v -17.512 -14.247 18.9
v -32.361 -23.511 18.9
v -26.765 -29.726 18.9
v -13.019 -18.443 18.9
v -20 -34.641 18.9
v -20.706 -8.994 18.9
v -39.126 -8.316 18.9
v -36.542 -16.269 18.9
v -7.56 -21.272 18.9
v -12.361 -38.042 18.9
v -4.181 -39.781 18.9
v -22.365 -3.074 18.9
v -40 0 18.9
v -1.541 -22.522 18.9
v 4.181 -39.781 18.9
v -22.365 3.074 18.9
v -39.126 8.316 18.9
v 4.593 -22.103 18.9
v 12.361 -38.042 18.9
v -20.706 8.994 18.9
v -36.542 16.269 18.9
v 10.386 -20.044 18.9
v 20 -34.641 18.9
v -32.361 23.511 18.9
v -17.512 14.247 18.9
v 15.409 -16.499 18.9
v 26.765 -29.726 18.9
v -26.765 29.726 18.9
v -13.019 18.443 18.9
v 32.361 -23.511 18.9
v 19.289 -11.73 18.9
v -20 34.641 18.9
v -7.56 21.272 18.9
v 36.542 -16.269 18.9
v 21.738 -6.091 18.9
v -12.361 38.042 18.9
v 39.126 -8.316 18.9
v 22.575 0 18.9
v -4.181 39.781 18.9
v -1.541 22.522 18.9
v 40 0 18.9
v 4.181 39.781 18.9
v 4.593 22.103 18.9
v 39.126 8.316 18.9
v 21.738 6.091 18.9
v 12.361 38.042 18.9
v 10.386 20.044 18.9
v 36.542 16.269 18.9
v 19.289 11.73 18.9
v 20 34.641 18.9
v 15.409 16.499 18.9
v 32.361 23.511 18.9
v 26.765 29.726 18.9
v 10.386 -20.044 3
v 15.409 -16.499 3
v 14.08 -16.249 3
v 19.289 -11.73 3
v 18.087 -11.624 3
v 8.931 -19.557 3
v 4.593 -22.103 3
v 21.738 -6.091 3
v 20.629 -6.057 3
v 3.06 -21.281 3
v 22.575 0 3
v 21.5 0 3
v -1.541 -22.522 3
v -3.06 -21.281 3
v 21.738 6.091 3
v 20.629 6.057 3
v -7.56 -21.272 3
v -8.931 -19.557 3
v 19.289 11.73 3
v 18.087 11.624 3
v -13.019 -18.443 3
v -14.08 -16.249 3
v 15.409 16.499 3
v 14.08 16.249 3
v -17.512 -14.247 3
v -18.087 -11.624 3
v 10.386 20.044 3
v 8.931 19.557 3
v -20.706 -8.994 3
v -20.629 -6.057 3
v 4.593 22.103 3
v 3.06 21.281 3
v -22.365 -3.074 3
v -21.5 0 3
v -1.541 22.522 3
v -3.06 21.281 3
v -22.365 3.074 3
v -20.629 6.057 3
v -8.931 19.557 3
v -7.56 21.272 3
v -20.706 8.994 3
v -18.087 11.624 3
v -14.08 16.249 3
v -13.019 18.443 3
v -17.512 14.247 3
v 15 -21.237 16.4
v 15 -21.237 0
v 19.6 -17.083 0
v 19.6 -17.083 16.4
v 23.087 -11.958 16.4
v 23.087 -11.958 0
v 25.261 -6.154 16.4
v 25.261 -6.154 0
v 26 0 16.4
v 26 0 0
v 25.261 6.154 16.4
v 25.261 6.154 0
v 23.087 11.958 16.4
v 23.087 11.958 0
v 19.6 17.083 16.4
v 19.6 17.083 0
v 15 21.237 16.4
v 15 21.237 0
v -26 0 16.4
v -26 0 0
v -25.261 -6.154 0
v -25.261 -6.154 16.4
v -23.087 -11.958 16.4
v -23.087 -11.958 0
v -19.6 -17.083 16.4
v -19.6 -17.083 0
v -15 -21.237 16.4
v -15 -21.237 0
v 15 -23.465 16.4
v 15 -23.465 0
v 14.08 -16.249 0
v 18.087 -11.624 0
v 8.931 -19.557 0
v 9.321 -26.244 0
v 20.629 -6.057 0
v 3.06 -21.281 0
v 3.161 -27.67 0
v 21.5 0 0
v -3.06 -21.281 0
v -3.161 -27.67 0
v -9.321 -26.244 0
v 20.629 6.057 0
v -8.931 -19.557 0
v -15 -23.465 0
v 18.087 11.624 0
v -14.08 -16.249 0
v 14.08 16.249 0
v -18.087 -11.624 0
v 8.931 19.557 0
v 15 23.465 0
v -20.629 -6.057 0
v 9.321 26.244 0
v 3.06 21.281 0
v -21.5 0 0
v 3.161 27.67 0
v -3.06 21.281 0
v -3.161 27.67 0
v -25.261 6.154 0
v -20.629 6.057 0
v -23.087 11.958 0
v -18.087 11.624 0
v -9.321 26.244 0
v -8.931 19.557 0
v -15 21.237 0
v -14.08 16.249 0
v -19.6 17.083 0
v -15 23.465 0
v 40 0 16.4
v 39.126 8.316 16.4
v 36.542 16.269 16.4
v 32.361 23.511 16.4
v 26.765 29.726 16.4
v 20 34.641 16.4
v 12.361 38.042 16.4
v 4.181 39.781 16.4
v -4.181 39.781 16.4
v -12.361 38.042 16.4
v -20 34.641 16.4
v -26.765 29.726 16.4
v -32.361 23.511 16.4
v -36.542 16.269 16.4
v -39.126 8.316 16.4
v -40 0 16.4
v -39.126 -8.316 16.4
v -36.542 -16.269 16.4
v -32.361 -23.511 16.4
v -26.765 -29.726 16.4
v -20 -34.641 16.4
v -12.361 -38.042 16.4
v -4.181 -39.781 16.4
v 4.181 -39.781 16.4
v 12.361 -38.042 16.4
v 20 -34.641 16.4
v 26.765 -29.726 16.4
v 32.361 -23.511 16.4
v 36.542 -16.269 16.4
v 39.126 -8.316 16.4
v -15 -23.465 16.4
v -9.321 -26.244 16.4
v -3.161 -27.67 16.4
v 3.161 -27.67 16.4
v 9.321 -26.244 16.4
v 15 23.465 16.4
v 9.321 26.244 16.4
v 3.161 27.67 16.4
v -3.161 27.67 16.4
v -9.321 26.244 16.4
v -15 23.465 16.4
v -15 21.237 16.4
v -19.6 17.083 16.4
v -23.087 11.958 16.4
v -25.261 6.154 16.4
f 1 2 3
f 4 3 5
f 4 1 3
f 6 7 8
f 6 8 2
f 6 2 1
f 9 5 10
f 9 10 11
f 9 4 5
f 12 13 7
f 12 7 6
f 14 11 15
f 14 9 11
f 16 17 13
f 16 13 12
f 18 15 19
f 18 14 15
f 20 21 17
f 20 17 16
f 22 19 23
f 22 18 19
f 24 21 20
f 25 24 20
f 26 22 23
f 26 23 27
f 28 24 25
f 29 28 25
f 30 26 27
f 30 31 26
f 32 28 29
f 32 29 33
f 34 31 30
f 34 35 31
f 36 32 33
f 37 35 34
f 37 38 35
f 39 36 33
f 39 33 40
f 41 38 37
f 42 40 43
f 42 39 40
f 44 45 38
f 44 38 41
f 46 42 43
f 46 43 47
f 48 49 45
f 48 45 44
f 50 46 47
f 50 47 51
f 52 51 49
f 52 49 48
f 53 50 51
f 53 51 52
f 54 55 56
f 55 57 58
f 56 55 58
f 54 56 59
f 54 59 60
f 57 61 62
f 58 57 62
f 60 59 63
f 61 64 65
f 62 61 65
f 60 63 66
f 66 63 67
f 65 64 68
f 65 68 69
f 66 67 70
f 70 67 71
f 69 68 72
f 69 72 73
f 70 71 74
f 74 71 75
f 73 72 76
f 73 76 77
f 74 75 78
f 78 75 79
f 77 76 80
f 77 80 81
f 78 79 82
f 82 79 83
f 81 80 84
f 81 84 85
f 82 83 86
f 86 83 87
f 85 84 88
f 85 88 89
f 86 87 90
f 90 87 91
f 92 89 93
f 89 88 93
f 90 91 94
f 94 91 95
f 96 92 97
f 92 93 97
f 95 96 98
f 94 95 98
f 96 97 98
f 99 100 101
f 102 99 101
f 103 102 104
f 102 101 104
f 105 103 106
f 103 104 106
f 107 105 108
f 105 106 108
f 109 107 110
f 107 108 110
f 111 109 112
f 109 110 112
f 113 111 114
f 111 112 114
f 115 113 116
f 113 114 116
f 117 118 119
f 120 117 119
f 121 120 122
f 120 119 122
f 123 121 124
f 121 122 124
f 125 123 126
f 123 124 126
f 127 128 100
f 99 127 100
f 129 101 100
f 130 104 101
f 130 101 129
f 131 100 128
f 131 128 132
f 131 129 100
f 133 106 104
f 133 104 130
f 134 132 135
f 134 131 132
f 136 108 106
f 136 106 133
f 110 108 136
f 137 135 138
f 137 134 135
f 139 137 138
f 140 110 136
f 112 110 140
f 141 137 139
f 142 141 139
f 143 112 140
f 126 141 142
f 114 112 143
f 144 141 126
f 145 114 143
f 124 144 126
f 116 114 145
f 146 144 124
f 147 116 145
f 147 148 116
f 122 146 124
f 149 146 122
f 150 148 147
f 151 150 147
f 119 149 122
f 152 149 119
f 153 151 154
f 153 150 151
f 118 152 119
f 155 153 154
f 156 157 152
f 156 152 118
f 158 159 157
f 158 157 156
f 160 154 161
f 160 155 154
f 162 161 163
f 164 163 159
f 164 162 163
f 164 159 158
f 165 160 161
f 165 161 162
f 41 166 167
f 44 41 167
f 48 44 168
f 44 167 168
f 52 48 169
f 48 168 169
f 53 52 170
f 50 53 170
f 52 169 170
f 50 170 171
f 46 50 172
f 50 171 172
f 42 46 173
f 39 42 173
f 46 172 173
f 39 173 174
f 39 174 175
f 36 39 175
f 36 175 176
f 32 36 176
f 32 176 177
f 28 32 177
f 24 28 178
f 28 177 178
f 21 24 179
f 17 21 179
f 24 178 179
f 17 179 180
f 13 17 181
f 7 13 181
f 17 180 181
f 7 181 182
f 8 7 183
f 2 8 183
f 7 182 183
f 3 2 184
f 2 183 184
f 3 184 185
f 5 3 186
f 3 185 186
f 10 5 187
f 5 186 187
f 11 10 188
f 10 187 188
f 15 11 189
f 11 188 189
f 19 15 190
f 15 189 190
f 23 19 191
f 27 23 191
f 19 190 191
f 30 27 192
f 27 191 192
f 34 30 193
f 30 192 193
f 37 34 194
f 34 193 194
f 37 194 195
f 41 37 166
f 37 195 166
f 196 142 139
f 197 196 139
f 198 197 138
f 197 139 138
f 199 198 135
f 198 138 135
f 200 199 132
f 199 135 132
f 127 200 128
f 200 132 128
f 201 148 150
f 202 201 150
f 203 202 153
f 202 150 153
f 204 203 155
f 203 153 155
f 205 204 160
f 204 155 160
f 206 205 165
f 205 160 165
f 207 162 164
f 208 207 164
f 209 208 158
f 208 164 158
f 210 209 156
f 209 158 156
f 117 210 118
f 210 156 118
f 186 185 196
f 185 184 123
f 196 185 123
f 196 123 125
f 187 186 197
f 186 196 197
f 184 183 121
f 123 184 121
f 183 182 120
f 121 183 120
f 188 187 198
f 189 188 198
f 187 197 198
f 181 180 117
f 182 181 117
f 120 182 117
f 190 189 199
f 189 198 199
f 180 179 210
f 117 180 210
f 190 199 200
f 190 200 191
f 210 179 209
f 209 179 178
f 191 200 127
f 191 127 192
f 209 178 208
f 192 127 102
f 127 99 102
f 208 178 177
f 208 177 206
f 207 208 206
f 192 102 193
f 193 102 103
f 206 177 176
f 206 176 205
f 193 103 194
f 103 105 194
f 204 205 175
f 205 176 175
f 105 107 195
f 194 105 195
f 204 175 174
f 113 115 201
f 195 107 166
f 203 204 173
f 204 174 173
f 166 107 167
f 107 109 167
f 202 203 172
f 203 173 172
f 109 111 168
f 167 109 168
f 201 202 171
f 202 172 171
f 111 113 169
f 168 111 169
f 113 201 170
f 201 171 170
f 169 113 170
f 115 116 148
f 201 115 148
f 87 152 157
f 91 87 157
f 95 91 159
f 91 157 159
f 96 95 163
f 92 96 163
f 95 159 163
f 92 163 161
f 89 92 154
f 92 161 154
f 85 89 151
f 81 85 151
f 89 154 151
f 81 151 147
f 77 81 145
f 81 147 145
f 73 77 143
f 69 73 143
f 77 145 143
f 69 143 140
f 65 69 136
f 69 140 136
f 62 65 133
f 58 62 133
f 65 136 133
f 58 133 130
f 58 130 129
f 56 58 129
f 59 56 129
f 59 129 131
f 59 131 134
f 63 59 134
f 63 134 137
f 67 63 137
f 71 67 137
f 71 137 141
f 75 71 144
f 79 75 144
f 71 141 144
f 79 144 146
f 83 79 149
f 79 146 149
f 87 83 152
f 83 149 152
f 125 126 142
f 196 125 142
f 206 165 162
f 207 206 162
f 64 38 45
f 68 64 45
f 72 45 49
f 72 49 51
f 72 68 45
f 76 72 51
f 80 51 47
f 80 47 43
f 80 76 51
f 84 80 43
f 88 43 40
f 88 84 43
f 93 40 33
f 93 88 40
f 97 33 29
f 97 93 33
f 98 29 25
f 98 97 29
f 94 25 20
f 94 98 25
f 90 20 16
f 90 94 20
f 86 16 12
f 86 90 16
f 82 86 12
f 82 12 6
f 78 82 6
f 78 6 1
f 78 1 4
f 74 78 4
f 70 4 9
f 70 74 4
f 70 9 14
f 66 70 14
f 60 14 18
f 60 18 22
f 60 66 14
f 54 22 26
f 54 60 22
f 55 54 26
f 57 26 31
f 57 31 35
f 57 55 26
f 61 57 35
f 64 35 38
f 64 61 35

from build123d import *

# Parameters (mm, degrees)
SKETCH1_R           = 27.85
SKETCH1_R_2         = 22.575
BOSS_EXTRUDE1_DEPTH = 16.4
SKETCH2_R           = 40
SKETCH2_R_2         = 22.575
BOSS_EXTRUDE2_DEPTH = 2.5
SKETCH3_R           = 22.575
SKETCH3_R_2         = 21.5
BOSS_EXTRUDE3_DEPTH = 3
CUT_EXTRUDE1_DEPTH  = 16.4


with BuildPart() as part:
    # Sketch1 → Boss-Extrude1 (new body)
    with BuildSketch(Plane.XY):
        Circle(SKETCH1_R)
        Circle(SKETCH1_R_2, mode=Mode.SUBTRACT)
    extrude(amount=BOSS_EXTRUDE1_DEPTH)

    # Sketch2 → Boss-Extrude2 (add)
    with BuildSketch(Plane.XY.offset(16.4)):
        Circle(SKETCH2_R)
        Circle(SKETCH2_R_2, mode=Mode.SUBTRACT)
    extrude(amount=BOSS_EXTRUDE2_DEPTH)

    # Sketch3 → Boss-Extrude3 (add)
    with BuildSketch(Plane(origin=(0, 0, 0), x_dir=(-1, 0, 0), z_dir=(0, 0, -1))):
        Circle(SKETCH3_R)
        Circle(SKETCH3_R_2, mode=Mode.SUBTRACT)
    extrude(amount=-BOSS_EXTRUDE3_DEPTH)

    # Sketch4 → Cut-Extrude1 (cut)
    with BuildSketch(Plane(origin=(0, 0, 0), x_dir=(-1, 0, 0), z_dir=(0, 0, -1))):
        with BuildLine():
            Line((-15, 21.236760582), (-15, 23.465346791))
            ThreePointArc((-15, 23.465346791), (-27.85, 0), (-15, -23.465346791))
            Line((-15, -23.465346791), (-15, -21.236760582))
            ThreePointArc((-15, -21.236760582), (-26, 0), (-15, 21.236760582))
        make_face()
        with BuildLine():
            ThreePointArc((27.85, 0), (24.427162136, 13.376705499), (15, 23.465346791))
            Line((15, 23.465346791), (15, 21.236760582))
            ThreePointArc((15, 21.236760582), (23.086792761, 11.958260743), (26, 0))
            ThreePointArc((26, 0), (23.086792761, -11.958260743), (15, -21.236760582))
            Line((15, -21.236760582), (15, -23.465346791))
            ThreePointArc((15, -23.465346791), (24.427162136, -13.376705499), (27.85, 0))
        make_face()
    extrude(amount=-CUT_EXTRUDE1_DEPTH, mode=Mode.SUBTRACT)


solid = part.part
